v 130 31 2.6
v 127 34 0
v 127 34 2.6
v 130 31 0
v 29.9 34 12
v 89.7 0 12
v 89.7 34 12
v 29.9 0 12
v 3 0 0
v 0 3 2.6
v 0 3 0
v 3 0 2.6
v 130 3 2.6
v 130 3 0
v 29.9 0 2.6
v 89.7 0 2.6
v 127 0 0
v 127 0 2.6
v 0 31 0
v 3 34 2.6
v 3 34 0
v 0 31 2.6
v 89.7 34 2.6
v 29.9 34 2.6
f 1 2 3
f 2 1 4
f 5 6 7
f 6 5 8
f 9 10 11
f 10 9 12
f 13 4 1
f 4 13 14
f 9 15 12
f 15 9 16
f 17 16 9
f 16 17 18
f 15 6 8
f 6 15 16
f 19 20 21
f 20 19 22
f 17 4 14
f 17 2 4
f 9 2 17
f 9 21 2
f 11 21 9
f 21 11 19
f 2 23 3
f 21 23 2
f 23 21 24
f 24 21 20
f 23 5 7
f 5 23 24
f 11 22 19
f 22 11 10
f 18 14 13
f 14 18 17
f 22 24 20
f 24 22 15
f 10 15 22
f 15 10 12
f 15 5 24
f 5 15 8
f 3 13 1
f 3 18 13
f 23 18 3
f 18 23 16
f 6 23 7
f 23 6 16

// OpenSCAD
$fn = 32;

// ----------------------------------------------------------------------
// Stepped bar: centerstep, 130 x 34 x 12/2.6 mm
// ----------------------------------------------------------------------

// --- parameters (mm) ---
bar_l = 130;              // bar length, X
bar_w = 34;               // bar width, Y
plate_t = 12;             // thickness of the thick zone, Z
thin_t = 2.6;             // thickness of the thin zone
corner_c = 3;             // corner chamfer of the bar
step_cut = 9.4;           // material removed from the thin zone
thick_from = 29.9;        // start of the thick middle zone
thick_to = 89.7;          // end of the thick middle zone
depth_1 = 9.4;            // depth of cut 1 from the top face
depth_2 = 9.4;            // depth of cut 2 from the top face

profile = [[3, 0], [127, 0], [130, 3], [130, 31], [127, 34], [3, 34], [0, 31], [0, 3]];  // primary outline, 8 points, counter clockwise
void_1 = [[-1, -1], [29.9, -1], [29.9, 35], [-1, 35]];  // thin left end, 4 points
void_2 = [[89.7, -1], [131, -1], [131, 35], [89.7, 35]];  // thin right end, 4 points

// --- the one profile operation ---
difference() {
  linear_extrude(height = plate_t) polygon(points = profile);
  translate([0, 0, plate_t - depth_1])
    linear_extrude(height = depth_1 + 1) polygon(points = void_1);
  translate([0, 0, plate_t - depth_2])
    linear_extrude(height = depth_2 + 1) polygon(points = void_2);
}
